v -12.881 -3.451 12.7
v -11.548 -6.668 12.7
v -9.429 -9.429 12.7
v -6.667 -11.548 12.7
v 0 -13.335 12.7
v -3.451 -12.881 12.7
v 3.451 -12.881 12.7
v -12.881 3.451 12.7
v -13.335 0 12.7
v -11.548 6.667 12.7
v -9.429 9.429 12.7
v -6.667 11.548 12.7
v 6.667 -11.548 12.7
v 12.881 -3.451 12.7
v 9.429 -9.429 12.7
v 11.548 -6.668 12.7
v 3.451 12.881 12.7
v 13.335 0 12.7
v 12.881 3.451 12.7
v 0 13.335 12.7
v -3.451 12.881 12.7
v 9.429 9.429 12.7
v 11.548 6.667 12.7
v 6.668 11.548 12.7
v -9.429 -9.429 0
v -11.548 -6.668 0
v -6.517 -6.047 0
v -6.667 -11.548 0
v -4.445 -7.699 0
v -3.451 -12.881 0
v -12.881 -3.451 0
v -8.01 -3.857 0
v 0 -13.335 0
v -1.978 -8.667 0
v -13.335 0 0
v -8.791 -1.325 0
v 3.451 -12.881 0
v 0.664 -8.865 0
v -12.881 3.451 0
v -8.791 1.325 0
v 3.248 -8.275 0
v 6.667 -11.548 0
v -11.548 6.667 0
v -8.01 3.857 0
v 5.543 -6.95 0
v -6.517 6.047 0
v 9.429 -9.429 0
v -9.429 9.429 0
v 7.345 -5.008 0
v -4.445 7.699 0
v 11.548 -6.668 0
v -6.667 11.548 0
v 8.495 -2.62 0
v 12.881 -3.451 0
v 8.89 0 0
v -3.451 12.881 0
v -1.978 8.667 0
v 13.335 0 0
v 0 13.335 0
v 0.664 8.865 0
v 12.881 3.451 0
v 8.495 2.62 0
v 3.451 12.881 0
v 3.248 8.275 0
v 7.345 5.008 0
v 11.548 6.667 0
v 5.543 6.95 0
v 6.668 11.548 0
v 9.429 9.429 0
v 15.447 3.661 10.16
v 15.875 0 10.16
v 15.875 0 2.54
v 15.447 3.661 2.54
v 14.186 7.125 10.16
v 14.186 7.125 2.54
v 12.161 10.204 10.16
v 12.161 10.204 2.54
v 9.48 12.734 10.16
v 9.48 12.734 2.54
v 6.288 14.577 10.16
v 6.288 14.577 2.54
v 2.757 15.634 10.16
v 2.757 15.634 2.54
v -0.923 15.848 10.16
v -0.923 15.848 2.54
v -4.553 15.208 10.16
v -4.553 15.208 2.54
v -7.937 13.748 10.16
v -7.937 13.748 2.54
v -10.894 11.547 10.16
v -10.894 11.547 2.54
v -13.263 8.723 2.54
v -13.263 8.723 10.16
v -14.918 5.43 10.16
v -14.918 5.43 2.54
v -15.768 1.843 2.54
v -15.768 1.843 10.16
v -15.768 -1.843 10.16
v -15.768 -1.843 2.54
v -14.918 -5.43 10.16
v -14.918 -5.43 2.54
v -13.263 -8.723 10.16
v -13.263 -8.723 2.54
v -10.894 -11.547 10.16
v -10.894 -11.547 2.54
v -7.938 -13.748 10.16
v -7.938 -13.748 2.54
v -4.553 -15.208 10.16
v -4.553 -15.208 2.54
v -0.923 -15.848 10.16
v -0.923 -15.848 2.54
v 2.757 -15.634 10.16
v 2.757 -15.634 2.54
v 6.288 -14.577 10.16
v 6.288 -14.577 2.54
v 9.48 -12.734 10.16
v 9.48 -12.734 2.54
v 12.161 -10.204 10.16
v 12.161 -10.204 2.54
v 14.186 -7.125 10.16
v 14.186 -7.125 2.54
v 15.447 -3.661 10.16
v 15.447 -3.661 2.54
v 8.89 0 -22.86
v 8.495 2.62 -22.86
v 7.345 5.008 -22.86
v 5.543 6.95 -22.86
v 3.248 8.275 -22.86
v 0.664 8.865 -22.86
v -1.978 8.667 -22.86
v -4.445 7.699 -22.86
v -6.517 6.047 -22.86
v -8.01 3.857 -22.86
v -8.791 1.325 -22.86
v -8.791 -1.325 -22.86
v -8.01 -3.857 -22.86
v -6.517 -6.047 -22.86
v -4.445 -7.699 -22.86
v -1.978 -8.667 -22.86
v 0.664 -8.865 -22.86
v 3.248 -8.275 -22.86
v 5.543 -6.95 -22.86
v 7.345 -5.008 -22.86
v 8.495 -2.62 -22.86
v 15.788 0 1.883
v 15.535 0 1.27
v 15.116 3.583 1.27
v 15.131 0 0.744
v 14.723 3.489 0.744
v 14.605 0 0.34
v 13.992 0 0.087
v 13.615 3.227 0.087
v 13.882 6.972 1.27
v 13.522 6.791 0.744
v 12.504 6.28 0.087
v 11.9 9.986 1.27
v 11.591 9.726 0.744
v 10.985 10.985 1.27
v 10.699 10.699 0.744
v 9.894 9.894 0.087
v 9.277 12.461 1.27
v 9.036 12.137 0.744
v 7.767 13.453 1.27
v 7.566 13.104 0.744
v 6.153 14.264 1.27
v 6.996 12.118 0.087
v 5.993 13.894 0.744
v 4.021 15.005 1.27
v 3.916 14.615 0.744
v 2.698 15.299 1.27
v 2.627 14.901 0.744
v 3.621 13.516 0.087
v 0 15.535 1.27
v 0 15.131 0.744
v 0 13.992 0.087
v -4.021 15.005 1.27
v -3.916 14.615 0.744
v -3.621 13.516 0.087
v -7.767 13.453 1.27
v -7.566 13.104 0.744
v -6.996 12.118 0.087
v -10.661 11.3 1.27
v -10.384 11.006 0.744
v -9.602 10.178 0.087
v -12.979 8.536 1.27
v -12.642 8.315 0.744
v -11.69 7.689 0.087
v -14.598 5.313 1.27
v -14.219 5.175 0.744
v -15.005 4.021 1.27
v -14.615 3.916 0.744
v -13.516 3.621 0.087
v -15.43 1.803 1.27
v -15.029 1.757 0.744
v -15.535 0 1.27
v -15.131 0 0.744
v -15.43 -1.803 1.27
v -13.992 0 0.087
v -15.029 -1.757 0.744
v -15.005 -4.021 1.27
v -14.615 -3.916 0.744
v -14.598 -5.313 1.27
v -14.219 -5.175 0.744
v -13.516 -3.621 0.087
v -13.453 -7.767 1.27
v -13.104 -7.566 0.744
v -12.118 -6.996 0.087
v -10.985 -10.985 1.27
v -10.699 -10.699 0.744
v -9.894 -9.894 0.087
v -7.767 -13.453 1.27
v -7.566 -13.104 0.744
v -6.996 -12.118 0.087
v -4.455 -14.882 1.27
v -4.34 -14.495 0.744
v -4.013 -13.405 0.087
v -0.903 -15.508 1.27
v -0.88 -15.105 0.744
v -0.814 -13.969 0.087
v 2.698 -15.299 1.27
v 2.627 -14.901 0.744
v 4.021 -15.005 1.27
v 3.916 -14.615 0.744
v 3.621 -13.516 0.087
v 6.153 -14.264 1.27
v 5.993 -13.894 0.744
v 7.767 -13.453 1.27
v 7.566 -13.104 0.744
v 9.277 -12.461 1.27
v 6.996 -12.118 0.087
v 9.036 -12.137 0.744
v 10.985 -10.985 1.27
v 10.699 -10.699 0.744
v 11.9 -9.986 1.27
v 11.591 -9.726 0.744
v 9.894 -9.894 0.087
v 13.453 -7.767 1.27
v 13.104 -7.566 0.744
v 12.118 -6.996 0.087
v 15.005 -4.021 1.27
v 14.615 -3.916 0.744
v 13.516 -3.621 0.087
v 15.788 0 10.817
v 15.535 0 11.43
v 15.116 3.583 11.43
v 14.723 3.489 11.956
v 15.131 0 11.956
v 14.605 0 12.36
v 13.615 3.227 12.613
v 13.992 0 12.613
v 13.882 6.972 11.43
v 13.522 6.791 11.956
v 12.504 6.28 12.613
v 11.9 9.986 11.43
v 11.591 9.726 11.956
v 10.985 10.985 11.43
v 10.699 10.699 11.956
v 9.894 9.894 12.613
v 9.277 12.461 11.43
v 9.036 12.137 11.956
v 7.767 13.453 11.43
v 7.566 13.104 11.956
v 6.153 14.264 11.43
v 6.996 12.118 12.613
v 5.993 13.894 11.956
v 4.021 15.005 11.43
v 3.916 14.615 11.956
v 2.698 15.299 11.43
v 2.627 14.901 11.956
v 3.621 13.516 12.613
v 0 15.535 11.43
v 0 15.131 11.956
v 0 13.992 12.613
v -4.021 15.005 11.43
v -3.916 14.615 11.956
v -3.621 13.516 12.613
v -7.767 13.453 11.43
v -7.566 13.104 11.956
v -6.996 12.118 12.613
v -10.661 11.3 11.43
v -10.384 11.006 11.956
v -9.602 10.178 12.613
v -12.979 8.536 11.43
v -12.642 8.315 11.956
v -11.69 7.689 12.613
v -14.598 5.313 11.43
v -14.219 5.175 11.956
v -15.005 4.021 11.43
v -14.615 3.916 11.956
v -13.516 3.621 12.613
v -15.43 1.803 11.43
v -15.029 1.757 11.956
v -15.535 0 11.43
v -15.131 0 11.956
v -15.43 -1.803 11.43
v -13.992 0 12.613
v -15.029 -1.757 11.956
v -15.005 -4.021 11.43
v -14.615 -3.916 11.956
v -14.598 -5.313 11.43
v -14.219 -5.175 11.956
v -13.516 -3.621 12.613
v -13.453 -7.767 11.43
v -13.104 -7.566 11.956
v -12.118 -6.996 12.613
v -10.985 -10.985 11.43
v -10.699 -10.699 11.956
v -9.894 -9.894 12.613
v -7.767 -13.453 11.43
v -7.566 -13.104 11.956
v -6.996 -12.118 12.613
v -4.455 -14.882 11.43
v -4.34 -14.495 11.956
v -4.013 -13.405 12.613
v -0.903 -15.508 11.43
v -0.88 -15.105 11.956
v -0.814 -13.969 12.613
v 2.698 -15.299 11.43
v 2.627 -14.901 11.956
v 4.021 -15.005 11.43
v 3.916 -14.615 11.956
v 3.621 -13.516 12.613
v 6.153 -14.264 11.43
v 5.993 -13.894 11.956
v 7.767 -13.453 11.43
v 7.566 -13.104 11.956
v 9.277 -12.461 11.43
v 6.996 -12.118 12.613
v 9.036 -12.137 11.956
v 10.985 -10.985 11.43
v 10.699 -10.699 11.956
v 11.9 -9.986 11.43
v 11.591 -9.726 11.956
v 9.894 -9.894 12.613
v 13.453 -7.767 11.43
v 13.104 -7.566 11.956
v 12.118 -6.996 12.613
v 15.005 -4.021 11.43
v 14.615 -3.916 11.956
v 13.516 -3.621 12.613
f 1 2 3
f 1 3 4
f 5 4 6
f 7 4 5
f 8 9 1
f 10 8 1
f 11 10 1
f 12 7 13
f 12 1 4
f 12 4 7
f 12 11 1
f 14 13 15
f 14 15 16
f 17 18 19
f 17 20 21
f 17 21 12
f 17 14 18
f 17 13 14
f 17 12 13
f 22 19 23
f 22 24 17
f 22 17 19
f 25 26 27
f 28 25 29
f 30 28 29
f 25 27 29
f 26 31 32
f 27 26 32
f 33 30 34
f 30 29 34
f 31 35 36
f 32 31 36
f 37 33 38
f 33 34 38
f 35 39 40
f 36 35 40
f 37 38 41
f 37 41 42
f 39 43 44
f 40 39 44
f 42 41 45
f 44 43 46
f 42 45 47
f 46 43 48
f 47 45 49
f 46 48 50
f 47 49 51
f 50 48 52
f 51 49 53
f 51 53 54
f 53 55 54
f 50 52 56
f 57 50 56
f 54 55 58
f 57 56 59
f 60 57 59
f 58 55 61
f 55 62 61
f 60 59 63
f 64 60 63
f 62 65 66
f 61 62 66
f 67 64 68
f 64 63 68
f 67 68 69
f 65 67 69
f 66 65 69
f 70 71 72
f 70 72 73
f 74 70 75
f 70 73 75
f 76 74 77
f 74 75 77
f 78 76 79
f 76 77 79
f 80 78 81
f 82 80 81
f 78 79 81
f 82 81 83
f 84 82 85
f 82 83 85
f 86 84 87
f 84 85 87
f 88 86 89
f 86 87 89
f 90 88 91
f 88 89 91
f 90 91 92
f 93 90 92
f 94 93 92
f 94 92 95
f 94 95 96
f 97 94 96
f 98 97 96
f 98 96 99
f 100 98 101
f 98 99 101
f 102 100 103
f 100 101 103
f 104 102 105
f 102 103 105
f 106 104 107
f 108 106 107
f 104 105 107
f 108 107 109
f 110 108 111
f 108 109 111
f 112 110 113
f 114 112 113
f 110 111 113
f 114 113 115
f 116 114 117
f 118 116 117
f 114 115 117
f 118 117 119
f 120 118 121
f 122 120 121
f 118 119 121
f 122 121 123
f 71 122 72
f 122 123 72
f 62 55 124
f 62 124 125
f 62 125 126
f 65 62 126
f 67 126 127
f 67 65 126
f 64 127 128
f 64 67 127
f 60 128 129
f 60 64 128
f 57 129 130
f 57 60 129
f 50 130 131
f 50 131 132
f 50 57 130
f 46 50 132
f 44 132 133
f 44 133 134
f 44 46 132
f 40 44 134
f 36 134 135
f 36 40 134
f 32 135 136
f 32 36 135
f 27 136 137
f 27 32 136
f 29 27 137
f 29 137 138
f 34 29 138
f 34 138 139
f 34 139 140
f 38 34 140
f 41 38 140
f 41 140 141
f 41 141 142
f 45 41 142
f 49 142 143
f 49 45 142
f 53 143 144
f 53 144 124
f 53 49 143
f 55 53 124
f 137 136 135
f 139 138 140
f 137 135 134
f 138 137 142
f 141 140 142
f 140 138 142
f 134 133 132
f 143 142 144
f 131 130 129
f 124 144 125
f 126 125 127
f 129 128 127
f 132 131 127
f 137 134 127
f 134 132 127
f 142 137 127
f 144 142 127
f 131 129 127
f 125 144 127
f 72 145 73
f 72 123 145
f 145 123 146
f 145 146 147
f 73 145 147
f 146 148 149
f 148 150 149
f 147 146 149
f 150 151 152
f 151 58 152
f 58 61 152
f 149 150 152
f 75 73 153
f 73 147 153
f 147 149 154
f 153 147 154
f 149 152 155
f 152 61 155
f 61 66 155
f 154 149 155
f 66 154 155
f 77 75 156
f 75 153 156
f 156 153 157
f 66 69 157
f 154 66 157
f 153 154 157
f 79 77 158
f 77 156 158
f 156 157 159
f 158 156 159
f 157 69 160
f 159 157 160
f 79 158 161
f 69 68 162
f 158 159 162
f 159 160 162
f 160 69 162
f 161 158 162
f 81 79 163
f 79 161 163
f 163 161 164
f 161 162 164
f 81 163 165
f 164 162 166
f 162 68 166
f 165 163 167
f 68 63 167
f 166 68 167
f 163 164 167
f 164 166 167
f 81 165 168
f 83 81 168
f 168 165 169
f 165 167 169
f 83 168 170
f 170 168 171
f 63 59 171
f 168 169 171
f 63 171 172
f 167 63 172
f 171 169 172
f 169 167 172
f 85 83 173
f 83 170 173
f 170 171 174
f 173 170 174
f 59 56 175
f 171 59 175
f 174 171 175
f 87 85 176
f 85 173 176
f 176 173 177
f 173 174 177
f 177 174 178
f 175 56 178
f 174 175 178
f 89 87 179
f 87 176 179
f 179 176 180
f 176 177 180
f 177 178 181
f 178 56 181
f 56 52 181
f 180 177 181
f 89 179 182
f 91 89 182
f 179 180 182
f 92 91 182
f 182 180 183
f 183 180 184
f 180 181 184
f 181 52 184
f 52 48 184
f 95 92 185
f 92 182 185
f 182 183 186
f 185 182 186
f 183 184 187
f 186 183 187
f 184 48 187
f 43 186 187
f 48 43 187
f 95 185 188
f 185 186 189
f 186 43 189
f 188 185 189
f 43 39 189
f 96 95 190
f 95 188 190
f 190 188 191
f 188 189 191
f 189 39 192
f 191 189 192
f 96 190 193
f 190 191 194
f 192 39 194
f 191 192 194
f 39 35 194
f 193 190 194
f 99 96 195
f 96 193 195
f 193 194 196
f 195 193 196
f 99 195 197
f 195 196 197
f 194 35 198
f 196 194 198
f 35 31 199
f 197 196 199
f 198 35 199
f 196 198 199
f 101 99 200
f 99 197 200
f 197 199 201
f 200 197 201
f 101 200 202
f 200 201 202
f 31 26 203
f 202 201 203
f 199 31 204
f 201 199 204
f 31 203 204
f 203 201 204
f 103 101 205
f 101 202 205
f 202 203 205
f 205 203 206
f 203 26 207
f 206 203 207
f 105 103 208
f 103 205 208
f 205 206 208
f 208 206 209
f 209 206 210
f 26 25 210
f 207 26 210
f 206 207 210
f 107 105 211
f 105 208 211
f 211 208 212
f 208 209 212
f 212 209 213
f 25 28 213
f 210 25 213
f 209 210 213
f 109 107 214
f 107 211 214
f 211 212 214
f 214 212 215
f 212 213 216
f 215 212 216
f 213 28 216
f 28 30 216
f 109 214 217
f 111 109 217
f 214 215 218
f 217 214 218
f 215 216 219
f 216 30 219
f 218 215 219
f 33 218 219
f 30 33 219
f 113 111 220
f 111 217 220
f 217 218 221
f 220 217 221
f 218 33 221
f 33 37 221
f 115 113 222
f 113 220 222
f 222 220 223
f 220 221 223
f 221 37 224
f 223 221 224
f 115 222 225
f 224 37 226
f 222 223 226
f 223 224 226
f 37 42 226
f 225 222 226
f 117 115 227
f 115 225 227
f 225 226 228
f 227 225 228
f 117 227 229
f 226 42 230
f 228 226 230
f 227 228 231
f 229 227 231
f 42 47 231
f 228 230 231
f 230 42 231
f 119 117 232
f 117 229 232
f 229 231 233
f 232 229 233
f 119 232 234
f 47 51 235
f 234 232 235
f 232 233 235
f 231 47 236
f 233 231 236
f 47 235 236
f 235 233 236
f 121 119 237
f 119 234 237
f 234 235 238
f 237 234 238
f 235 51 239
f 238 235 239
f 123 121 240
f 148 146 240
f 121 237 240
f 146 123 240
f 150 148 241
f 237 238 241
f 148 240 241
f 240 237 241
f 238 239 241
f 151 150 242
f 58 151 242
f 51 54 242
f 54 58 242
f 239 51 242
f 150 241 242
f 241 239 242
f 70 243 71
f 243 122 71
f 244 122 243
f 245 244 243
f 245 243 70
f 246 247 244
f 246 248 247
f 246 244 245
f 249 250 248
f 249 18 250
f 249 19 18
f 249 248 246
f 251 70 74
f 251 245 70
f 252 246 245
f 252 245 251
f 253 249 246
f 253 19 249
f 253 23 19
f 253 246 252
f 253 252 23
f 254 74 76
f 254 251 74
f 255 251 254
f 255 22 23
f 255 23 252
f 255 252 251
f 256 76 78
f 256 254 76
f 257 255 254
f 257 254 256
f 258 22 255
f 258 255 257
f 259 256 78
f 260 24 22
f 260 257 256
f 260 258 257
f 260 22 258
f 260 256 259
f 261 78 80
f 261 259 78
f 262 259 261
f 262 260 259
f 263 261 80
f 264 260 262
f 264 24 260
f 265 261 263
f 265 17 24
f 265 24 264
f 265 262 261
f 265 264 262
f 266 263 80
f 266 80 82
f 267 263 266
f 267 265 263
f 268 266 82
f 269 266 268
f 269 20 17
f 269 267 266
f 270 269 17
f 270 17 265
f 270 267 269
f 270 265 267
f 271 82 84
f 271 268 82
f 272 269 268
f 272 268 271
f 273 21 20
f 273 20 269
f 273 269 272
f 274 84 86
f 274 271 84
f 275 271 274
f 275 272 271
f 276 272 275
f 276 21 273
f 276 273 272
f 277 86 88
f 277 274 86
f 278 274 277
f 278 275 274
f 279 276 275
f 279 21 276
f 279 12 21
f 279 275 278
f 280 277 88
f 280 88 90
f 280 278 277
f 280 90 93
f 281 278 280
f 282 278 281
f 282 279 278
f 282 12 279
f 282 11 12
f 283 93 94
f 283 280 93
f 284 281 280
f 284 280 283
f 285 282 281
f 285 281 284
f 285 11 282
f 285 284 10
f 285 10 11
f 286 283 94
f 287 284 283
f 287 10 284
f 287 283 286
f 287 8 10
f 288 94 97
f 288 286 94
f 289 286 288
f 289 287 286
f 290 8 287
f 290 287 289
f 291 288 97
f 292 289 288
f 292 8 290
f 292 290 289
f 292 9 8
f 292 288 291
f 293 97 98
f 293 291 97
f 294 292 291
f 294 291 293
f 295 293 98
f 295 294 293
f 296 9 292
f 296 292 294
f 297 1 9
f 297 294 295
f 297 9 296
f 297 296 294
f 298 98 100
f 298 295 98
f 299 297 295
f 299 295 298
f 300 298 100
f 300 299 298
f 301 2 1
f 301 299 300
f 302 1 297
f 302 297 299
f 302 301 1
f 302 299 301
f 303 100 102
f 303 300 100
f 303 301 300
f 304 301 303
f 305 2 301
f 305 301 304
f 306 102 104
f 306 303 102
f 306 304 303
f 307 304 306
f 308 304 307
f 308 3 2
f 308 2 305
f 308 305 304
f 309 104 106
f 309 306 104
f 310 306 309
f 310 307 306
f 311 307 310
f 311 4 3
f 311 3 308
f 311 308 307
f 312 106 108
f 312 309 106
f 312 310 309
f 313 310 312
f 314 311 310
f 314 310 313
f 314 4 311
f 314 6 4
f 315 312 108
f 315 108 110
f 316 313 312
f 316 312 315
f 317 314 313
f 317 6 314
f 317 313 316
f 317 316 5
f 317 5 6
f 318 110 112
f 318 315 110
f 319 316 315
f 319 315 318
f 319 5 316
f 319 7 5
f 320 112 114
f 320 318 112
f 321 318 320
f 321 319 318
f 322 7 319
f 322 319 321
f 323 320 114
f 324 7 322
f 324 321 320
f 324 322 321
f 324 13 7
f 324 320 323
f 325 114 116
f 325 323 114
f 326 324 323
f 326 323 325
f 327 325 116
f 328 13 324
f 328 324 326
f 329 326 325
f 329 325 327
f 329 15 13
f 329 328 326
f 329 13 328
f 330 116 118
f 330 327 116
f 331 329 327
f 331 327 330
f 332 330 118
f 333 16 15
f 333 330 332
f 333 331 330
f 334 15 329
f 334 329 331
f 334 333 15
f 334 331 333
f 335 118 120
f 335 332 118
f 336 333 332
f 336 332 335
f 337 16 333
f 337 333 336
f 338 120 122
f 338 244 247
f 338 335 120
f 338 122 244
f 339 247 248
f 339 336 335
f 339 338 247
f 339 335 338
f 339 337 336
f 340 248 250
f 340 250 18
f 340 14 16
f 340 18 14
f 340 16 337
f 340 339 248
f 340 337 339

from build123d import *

# Parameters (mm, degrees)
F0_R     = 15.875
F1_DEPTH = 12.7
F2_R     = 2.54
F3_R     = 8.89
F4_DEPTH = 22.86


with BuildPart() as f1:
    # F0 (on Top) → F1 (new body)
    with BuildSketch(Plane.XY):
        Circle(F0_R)
    extrude(amount=F1_DEPTH)

    # F2
    f2_edges = [f1.edges().sort_by_distance(p)[0] for p in [
        (-15.875, 0, 12.7),
        (15.875, 0, 6.35),
        (-15.875, 0, 0),
    ]]
    fillet(f2_edges, radius=F2_R)

    # F3 (on Top) → F4 (join)
    with BuildSketch(Plane.XY):
        Circle(F3_R)
    extrude(amount=-F4_DEPTH)


solid = f1.part
